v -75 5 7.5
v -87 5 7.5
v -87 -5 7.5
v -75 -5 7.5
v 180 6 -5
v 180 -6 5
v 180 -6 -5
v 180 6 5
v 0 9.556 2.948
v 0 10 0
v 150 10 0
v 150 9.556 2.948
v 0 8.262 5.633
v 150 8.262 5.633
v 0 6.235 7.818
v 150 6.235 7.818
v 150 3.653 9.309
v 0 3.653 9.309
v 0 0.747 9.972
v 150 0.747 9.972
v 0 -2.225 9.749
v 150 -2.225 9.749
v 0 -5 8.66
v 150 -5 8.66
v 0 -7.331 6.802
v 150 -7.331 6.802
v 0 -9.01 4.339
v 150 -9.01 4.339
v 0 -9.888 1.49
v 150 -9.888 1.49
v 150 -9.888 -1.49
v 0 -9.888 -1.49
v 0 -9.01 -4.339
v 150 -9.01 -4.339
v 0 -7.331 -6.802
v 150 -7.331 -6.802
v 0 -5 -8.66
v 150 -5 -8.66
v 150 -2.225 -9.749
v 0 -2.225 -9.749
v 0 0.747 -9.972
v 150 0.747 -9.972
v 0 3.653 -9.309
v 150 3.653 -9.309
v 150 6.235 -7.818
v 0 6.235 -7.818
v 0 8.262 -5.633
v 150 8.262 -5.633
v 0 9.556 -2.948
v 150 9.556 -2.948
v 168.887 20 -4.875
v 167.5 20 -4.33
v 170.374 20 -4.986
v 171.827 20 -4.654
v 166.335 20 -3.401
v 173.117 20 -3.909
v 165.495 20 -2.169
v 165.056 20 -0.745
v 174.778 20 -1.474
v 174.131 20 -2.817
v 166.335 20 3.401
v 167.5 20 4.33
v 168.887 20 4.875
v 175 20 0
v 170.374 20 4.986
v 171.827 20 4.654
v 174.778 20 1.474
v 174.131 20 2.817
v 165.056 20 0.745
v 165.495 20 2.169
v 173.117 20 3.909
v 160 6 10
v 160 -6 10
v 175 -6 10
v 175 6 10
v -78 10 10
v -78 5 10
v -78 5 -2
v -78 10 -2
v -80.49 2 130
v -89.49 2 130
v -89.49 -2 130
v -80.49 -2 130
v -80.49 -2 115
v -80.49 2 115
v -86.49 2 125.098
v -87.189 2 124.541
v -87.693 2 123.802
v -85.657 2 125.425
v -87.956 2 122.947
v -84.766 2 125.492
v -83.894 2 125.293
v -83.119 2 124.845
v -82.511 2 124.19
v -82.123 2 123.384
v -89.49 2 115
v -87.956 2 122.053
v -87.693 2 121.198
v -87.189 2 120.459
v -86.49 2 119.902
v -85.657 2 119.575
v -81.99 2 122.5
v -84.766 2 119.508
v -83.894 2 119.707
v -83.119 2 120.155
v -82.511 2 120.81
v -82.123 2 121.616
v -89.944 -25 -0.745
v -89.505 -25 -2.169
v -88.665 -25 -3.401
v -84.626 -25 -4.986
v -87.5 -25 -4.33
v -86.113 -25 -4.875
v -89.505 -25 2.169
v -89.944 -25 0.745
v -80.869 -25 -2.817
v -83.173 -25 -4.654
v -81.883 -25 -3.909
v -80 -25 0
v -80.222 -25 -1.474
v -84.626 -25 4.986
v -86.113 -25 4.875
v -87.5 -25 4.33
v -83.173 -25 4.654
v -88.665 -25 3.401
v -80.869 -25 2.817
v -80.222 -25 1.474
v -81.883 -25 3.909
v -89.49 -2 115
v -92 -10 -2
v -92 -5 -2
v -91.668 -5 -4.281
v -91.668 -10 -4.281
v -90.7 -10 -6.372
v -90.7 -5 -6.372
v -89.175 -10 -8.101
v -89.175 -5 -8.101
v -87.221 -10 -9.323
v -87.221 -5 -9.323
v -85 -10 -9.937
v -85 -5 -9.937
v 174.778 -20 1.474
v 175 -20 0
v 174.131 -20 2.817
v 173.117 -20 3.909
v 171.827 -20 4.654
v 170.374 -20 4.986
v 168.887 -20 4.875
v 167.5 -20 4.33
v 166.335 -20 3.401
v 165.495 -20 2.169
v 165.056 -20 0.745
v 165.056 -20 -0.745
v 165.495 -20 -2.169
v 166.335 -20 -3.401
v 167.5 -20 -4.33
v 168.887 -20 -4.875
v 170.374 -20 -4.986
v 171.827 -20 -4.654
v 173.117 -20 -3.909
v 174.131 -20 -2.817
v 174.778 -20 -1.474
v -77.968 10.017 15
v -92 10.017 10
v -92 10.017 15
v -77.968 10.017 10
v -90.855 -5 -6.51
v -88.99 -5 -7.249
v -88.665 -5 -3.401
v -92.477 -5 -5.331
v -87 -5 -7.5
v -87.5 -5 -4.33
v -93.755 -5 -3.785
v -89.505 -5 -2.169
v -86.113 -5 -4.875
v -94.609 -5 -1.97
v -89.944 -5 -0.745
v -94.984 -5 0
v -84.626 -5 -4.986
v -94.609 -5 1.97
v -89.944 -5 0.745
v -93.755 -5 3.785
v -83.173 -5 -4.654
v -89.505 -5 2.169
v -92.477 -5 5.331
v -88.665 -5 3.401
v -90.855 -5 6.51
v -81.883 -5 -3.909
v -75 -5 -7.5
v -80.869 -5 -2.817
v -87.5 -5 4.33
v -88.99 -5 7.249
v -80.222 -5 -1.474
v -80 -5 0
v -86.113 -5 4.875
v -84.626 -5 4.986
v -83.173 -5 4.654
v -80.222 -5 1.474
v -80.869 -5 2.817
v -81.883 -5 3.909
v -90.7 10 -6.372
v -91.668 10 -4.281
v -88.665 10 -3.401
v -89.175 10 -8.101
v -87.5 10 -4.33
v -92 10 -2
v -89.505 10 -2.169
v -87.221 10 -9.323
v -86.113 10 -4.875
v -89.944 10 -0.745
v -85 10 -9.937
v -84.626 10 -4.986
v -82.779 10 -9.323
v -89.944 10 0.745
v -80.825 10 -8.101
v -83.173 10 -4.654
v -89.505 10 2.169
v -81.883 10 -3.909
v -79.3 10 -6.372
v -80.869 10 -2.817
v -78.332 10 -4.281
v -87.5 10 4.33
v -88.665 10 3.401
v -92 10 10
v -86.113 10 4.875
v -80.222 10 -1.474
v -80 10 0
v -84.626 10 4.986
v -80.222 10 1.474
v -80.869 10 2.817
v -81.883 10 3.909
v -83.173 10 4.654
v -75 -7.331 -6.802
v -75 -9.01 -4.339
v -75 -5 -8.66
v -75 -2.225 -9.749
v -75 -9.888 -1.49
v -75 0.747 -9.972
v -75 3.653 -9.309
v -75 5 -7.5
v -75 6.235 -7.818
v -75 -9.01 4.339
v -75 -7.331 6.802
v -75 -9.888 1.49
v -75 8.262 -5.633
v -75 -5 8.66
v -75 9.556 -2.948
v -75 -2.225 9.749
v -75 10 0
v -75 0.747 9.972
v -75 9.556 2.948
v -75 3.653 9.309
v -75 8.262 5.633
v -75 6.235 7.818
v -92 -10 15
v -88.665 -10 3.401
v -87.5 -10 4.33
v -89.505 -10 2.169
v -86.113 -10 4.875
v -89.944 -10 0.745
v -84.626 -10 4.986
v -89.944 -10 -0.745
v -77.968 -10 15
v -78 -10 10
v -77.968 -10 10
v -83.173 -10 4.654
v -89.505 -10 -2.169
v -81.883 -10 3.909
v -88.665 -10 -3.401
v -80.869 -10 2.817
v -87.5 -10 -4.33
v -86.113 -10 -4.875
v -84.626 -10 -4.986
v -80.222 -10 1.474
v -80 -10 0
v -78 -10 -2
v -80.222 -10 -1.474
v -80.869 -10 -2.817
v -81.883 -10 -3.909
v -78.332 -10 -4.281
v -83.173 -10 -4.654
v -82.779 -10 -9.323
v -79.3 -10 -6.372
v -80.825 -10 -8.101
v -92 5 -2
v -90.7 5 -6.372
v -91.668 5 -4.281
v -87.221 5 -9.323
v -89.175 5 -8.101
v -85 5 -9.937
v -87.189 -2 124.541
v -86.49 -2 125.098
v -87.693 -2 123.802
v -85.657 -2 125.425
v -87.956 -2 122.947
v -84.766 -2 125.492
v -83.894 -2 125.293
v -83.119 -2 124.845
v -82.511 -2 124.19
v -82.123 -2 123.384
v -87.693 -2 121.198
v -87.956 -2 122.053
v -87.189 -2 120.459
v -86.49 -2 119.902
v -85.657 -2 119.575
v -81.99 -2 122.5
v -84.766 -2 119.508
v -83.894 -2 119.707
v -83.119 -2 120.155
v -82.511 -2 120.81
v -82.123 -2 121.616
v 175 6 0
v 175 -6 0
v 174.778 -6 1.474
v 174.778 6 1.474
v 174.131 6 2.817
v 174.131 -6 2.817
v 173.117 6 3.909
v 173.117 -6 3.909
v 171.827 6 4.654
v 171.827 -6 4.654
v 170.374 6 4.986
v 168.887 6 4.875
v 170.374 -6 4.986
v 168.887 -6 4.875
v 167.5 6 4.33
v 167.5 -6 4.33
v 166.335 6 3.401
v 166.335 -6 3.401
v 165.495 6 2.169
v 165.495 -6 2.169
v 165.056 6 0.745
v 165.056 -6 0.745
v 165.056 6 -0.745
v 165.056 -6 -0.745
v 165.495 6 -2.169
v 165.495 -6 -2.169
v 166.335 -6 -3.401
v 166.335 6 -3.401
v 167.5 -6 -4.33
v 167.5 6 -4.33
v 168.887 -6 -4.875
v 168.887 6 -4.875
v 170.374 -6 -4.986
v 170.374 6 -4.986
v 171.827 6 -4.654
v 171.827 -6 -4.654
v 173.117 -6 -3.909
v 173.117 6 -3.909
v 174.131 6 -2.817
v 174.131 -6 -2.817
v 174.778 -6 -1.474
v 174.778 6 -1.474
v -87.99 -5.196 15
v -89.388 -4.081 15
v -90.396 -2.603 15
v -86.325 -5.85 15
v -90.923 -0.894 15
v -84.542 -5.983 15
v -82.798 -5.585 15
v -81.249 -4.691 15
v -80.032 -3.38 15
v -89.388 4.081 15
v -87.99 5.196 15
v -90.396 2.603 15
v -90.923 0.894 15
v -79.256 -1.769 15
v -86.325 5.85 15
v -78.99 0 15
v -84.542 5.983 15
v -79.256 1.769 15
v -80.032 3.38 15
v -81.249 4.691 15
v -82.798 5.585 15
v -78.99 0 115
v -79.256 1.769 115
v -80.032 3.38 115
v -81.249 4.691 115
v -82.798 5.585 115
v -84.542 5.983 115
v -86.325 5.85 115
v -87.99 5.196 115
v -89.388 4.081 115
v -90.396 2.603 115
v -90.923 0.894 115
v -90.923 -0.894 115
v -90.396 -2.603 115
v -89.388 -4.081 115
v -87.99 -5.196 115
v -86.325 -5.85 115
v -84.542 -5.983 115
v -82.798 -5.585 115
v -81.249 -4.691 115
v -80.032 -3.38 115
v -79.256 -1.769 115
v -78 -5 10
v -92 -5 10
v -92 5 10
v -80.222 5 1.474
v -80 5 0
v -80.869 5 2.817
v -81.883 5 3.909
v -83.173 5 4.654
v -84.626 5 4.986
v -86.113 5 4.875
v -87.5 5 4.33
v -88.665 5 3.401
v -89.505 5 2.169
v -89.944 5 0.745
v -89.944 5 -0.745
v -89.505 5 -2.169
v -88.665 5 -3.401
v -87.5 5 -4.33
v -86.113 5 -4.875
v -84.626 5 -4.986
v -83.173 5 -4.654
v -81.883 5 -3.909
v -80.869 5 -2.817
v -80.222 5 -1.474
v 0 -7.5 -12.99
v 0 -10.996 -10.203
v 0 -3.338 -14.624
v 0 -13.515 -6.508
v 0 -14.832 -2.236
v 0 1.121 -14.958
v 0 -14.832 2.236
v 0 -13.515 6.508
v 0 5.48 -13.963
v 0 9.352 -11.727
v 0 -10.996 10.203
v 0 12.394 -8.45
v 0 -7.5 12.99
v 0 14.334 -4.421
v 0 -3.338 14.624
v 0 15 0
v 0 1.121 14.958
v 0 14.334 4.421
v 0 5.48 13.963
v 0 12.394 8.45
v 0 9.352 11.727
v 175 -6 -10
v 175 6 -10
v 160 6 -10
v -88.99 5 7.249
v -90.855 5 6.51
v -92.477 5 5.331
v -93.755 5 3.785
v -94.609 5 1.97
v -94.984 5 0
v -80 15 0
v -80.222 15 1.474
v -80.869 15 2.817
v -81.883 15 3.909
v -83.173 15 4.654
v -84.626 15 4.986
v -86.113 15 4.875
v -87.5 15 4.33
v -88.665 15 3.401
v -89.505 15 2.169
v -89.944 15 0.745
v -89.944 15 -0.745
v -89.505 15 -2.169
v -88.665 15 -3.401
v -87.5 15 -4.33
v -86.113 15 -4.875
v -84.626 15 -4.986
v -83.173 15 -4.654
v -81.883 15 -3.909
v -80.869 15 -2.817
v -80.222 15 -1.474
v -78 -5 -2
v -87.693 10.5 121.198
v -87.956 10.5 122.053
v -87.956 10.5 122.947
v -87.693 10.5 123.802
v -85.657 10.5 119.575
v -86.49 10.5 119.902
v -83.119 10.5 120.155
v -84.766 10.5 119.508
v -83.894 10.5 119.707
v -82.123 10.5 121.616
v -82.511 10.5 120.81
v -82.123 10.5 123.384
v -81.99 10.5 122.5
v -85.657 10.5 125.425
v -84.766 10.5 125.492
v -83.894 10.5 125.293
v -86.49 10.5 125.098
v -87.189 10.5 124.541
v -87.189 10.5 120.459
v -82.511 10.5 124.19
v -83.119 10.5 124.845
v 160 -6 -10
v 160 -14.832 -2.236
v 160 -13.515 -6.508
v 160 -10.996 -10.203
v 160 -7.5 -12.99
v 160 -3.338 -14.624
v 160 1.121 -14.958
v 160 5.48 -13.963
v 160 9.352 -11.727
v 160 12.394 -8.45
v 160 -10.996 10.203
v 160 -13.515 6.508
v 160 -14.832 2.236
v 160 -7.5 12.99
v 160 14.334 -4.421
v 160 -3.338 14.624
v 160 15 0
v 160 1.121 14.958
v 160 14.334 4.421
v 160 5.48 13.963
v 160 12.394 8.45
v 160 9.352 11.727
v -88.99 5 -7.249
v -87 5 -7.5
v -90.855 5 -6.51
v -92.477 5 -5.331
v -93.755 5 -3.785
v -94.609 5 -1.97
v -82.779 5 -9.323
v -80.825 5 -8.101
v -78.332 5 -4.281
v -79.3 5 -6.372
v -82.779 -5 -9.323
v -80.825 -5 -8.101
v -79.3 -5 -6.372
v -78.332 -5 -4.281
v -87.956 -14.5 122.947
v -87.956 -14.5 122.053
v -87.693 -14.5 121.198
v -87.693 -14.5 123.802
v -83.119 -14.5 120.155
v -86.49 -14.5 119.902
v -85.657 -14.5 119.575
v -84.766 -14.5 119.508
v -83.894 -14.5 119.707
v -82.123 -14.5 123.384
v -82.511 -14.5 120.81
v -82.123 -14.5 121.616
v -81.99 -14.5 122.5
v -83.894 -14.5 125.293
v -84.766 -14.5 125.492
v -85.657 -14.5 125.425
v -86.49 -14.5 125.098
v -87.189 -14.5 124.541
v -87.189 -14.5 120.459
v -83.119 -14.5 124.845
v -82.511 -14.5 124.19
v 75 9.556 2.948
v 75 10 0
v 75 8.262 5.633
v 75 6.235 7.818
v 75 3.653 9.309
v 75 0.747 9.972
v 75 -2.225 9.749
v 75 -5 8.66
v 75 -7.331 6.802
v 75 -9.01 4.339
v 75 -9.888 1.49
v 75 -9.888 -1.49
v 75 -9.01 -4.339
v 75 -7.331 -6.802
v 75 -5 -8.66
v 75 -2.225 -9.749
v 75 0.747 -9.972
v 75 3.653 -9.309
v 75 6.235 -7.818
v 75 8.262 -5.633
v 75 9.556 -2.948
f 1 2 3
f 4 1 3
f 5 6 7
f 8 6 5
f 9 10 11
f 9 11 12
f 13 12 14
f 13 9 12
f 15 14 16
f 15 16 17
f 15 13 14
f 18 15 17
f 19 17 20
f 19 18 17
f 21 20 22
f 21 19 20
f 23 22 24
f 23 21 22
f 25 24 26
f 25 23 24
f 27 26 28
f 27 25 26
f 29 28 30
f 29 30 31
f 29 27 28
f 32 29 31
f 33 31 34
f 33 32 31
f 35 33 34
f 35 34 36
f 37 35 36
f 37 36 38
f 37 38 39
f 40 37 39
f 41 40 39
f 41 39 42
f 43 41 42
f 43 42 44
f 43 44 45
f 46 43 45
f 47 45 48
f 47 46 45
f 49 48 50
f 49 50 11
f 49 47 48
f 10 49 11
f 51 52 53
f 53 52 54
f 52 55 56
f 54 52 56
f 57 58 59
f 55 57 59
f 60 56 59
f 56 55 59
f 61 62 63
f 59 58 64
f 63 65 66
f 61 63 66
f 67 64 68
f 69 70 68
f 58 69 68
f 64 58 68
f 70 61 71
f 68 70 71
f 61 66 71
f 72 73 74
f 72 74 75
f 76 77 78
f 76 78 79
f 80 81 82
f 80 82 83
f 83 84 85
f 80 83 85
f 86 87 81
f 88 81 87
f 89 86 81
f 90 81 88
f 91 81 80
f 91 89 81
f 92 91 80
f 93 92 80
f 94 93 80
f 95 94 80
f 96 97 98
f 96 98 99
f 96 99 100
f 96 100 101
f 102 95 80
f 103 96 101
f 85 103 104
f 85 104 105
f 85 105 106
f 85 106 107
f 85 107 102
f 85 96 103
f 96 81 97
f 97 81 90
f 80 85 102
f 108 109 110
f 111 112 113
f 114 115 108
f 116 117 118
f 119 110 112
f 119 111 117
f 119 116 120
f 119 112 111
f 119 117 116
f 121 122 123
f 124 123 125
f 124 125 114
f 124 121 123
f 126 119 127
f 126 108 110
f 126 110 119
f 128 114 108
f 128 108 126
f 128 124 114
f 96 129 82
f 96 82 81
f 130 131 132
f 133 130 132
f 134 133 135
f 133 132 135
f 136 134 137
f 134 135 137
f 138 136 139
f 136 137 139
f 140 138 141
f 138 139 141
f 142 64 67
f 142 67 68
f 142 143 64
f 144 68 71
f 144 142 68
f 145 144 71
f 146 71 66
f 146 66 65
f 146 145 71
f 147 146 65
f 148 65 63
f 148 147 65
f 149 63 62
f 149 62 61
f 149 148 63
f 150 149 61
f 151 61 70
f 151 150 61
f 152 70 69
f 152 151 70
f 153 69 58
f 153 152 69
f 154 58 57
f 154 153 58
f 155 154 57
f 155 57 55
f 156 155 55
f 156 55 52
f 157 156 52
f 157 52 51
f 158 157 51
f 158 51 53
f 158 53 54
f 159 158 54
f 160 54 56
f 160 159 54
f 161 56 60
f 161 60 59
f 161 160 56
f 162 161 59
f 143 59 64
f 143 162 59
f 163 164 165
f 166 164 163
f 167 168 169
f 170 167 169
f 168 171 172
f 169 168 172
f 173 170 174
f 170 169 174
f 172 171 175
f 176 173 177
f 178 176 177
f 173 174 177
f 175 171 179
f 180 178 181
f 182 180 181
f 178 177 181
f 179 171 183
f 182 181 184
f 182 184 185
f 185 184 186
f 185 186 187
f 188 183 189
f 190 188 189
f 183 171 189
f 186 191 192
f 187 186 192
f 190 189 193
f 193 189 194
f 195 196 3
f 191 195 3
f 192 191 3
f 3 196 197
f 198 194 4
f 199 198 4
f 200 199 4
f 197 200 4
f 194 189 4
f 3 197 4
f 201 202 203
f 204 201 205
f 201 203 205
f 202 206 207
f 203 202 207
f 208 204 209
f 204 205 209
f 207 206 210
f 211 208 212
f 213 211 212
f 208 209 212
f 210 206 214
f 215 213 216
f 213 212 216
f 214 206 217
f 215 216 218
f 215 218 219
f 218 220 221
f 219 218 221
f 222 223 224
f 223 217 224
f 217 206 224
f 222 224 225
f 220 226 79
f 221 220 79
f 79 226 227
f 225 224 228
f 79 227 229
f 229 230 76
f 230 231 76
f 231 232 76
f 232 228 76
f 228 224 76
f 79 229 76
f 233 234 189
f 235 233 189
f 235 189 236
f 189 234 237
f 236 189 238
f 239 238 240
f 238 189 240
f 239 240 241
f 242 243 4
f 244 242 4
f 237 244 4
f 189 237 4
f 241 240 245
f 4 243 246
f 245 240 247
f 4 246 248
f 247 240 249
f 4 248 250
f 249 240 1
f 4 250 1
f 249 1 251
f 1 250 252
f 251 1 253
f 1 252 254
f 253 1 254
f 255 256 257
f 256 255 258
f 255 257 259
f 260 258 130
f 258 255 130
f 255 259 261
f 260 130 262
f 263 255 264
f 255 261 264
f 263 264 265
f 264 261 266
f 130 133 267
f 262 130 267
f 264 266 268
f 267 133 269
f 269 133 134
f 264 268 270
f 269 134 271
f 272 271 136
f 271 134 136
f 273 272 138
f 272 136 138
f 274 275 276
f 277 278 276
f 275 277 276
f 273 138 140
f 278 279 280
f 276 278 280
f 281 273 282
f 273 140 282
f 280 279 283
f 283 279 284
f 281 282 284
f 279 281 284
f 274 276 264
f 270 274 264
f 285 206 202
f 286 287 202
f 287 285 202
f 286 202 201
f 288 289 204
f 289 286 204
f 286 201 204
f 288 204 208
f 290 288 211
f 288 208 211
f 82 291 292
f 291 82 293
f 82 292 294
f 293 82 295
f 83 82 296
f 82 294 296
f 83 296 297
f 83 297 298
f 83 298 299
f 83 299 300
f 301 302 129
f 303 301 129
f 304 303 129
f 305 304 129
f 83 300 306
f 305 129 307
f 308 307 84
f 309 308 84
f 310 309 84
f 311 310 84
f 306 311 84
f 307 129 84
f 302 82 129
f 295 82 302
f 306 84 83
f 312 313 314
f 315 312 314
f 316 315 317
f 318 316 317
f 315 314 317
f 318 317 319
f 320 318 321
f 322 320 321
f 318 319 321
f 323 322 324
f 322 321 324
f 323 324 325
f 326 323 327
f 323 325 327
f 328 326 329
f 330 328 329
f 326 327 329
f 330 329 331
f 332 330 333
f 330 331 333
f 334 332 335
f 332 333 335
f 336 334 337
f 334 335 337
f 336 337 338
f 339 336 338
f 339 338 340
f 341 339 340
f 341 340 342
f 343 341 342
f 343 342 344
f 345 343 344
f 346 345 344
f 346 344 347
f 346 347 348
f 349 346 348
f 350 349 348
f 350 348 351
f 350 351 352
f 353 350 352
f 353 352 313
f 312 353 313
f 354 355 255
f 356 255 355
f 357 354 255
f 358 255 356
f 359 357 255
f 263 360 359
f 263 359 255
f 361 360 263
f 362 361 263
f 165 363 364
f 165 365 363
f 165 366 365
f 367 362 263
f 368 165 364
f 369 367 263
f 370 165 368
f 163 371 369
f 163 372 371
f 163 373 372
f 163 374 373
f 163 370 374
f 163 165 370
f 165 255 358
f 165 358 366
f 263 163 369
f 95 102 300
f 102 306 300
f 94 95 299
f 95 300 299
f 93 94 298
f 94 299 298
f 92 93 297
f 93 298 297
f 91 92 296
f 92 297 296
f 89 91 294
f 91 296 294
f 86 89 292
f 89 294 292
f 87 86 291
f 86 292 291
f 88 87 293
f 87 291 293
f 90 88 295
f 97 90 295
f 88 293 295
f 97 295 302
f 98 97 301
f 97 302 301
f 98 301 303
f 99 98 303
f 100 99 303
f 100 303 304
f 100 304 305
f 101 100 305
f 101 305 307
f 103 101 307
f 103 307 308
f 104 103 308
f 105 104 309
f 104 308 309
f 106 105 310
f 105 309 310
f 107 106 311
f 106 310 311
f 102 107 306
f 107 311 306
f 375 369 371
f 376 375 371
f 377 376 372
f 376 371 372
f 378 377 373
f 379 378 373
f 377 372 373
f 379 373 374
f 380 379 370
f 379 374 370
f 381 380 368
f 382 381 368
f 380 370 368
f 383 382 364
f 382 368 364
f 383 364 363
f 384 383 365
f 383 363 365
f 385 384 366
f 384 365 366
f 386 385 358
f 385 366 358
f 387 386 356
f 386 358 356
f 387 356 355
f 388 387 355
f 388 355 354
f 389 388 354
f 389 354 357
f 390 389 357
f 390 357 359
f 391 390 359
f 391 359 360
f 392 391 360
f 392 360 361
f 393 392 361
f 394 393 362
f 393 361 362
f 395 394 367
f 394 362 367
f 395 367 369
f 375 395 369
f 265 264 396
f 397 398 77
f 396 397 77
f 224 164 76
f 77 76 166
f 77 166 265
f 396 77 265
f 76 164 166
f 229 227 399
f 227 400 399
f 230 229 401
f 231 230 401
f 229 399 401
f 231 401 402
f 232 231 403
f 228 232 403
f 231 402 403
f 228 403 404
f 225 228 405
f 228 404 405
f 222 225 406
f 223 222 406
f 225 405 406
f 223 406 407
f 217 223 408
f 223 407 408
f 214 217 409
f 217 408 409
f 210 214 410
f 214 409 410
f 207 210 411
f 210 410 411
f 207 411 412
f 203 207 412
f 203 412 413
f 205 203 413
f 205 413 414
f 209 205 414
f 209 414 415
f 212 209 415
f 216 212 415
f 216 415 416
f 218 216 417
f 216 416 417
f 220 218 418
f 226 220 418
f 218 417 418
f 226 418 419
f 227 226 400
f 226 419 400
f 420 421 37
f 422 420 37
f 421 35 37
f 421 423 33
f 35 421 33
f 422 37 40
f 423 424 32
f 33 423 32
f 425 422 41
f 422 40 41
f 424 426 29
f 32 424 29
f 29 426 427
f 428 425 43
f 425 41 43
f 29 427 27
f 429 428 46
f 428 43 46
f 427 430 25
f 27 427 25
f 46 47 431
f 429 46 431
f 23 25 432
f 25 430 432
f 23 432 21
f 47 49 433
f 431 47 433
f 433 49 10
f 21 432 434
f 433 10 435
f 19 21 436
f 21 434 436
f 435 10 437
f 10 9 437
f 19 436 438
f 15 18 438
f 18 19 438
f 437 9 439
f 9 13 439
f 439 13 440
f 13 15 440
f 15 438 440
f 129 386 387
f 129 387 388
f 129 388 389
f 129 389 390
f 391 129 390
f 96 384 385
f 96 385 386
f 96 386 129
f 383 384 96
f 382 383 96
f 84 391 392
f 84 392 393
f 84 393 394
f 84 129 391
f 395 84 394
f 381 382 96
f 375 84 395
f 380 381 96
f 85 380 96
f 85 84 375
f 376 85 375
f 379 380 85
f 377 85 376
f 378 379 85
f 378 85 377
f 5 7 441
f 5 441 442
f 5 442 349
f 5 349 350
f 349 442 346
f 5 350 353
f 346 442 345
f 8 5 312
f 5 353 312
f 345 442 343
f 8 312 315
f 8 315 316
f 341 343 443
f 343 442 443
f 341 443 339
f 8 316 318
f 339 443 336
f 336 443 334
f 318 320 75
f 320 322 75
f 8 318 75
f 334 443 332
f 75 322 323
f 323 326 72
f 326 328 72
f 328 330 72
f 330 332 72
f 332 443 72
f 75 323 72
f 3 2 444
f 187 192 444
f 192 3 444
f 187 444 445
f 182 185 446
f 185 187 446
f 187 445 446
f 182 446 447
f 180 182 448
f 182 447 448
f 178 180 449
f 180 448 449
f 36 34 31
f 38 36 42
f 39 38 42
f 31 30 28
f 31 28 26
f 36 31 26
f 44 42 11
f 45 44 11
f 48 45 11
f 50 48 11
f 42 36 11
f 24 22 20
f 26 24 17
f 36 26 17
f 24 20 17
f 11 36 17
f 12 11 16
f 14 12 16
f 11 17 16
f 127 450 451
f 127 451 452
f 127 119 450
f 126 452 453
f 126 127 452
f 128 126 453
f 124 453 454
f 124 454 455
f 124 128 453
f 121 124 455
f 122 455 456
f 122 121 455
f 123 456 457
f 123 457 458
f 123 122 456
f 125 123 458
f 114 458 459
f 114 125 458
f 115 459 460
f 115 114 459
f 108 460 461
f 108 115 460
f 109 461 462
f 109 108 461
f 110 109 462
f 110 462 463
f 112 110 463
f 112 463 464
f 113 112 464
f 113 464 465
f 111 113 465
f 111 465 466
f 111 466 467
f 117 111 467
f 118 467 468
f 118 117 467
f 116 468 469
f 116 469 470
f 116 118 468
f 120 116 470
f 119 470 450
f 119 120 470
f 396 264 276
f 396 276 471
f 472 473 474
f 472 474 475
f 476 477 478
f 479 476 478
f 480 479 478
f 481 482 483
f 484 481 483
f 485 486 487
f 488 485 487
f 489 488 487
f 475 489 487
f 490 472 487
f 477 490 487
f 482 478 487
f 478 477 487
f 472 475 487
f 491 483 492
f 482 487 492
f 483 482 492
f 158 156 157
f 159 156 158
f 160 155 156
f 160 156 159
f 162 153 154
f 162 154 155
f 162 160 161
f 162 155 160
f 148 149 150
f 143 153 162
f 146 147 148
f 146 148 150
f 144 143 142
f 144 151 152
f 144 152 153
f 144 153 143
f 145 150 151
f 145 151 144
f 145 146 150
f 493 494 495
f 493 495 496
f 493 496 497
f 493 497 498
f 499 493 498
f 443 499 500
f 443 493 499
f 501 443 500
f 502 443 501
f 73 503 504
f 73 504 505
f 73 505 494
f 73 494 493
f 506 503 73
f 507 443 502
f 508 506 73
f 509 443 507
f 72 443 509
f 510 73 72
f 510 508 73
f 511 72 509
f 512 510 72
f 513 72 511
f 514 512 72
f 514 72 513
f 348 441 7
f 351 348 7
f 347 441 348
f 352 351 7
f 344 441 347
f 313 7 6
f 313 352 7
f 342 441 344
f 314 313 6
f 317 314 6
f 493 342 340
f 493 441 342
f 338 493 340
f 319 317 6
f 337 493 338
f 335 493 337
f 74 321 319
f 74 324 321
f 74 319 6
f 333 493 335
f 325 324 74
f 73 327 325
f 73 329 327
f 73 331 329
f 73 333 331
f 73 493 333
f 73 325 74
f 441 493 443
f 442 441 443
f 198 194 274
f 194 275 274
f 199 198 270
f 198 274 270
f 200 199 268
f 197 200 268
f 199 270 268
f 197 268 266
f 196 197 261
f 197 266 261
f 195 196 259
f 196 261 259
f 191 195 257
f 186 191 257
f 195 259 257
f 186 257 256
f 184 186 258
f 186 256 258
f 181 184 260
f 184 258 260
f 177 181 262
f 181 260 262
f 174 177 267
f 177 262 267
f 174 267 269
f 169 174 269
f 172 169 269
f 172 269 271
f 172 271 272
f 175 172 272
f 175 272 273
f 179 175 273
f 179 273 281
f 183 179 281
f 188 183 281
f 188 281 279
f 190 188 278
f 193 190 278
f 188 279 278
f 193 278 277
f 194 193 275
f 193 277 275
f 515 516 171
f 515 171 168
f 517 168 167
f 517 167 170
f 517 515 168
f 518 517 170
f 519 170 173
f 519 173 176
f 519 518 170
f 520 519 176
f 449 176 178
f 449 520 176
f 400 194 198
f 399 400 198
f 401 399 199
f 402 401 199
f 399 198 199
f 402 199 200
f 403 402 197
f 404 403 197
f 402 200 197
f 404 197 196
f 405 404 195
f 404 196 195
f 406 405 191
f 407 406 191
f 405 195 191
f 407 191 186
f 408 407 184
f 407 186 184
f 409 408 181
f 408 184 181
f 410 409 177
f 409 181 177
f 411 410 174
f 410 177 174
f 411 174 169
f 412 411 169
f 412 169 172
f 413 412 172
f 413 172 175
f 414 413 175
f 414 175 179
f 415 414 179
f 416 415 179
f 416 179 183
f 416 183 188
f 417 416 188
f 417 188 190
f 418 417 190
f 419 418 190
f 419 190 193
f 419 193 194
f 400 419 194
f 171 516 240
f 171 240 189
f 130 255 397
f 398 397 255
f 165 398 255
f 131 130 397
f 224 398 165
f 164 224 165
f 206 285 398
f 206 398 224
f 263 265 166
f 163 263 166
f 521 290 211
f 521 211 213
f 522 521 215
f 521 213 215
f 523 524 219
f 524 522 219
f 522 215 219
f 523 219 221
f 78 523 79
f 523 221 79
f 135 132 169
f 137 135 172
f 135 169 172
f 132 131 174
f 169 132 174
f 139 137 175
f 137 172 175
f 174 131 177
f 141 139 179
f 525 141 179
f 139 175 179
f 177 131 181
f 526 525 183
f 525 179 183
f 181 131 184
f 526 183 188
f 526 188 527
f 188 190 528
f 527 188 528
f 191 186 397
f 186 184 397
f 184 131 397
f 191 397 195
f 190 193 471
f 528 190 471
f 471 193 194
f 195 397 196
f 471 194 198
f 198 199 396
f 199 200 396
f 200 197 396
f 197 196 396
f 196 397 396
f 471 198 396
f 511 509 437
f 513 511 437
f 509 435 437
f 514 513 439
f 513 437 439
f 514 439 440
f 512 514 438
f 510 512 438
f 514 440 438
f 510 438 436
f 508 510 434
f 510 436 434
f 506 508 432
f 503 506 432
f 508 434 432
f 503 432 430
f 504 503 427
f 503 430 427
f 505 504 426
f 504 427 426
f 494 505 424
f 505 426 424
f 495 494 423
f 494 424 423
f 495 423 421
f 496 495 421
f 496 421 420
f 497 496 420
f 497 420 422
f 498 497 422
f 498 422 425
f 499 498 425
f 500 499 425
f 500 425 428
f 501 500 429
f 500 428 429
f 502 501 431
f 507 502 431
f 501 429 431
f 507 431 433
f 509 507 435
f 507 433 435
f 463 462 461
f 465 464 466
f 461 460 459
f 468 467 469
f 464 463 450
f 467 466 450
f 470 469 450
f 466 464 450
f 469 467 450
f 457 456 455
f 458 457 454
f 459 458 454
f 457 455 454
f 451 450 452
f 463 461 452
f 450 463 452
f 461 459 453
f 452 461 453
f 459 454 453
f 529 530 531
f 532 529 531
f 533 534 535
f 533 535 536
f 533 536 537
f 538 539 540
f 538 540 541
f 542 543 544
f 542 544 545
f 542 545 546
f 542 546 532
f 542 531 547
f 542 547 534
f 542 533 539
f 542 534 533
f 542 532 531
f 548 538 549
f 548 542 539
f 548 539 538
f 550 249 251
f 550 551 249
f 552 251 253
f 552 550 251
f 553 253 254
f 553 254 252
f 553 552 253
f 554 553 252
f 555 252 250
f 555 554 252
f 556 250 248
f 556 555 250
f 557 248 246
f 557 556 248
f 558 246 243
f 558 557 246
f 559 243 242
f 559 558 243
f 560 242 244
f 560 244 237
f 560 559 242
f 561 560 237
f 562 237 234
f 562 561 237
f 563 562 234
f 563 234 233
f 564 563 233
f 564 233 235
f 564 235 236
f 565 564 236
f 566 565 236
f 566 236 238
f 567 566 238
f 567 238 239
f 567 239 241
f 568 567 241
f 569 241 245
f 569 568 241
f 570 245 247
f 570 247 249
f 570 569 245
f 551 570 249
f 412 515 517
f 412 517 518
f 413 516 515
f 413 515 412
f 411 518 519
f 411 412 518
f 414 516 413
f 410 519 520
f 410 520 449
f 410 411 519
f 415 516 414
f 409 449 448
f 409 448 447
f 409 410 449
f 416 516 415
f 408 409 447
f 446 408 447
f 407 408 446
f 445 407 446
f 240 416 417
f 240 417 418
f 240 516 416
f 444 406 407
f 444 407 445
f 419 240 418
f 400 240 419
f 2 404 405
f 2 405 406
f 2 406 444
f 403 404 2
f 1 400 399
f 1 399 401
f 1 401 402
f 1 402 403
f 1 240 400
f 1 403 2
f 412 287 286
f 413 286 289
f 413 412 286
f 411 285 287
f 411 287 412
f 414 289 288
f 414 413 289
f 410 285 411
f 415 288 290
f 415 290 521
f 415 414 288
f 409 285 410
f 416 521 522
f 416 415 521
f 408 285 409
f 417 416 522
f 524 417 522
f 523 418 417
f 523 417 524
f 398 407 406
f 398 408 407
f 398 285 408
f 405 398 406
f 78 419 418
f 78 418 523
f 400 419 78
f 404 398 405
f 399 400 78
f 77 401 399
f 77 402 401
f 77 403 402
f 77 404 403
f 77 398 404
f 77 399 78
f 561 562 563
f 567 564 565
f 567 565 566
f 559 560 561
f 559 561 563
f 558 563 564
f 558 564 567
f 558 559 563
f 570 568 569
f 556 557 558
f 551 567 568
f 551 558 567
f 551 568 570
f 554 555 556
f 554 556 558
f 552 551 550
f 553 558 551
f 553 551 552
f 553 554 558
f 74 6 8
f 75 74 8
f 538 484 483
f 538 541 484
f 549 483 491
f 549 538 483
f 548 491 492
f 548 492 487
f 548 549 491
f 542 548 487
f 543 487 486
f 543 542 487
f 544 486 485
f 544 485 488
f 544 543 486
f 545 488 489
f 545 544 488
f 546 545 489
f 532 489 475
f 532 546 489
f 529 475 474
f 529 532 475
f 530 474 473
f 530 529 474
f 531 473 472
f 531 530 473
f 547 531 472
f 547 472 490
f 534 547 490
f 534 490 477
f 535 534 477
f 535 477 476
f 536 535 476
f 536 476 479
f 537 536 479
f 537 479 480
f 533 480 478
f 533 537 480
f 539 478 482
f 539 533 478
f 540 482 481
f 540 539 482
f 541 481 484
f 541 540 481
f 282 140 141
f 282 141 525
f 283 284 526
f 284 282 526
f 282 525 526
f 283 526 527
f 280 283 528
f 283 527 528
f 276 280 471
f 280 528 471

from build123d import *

# Parameters (mm, degrees)
F0_R         = 10
F1_DEPTH     = 75
F2_R         = 15
F2_R_2       = 10
F3_DEPTH     = 150
F4_R         = 15
F5_DEPTH     = 10
F6_W         = 12
F6_H         = 20
F7_DEPTH     = 20
F8_R         = 5
F9_DEPTH     = 21.001
F10_SIZE     = 5
F11_W        = 10
F11_H        = 15
F12_DEPTH    = 20
F13_R        = 5
F14_DEPTH    = 20.001
F15_R        = 5
F16_DEPTH    = 20
F17_W        = 14
F17_H        = 5
F18_DEPTH    = 10
F19_W        = 14.032341361
F19_H        = 20.0174024701
F20_DEPTH    = 5
F21_R        = 5
F22_DEPTH    = 20
F24_T1_DEPTH = 45
F24_T3_DEPTH = 45
F25_R        = 6
F26_DEPTH    = 100
F27_W        = 9
F27_H        = 4
F28_DEPTH    = 15
F29_R        = 3
F30_DEPTH    = 12.5
F32_T1_DEPTH = 50


# Not quite as in the source:
# - a fillet or chamfer that OpenCascade refuses, or shapes differently, is made with other operations: its cross-section is extruded or revolved along the edge and cut away or added


with BuildPart() as f1:
    # F0 (on Right) → F1 (new body, symmetric)
    with BuildSketch(Plane.YZ):
        Circle(F0_R)
    extrude(amount=F1_DEPTH, both=True)

    # F11 (on face) → F12 (join)
    with BuildSketch(Plane(origin=(-75, 0, 0), x_dir=(0, -1, 0), z_dir=(-1, 0, 0))):
        Rectangle(F11_W, F11_H)
    extrude(amount=F12_DEPTH)

    # F13 (on face) → F14 (cut, through all)
    with BuildSketch(Plane.XZ.offset(5)):
        with Locations((-85, 0)):
            Circle(F13_R)
    extrude(amount=-F14_DEPTH, mode=Mode.SUBTRACT)

    # F32: fillet of radius 8 on 2 edges, made by hand

    # F32_s2 → F32_t1 (cut)
    with BuildSketch(Plane.XZ.offset(-25)):
        with BuildLine():
            ThreePointArc((-87, 7.5), (-92.6568542495, 5.1568542495), (-95, -0.5))
            Line((-95, -0.5), (-95, 7.5))
            Line((-95, 7.5), (-87, 7.5))
        make_face()
        with BuildLine():
            ThreePointArc((-87, -7.5), (-92.6568542495, -5.1568542495), (-95, 0.5))
            Line((-95, 0.5), (-95, -7.5))
            Line((-95, -7.5), (-87, -7.5))
        make_face()
    extrude(amount=F32_T1_DEPTH, mode=Mode.SUBTRACT)


with BuildPart() as f3:
    # F2 (on Right) → F3 (new body)
    with BuildSketch(Plane.YZ):
        Circle(F2_R)
        Circle(F2_R_2, mode=Mode.SUBTRACT)
    extrude(amount=F3_DEPTH)

    # F4 (on face) → F5 (join)
    with BuildSketch(Plane.YZ.offset(150)):
        Circle(F4_R)
    extrude(amount=F5_DEPTH)

    # F6 (on face) → F7 (join)
    with BuildSketch(Plane.YZ.offset(160)):
        Rectangle(F6_W, F6_H)
    extrude(amount=F7_DEPTH)

    # F8 (on face) → F9 (cut, through all)
    with BuildSketch(Plane.XZ.offset(6)):
        with Locations((170, 0)):
            Circle(F8_R)
    extrude(amount=-F9_DEPTH, mode=Mode.SUBTRACT)

    # F10
    f10_edges = [f3.edges().sort_by_distance(p)[0] for p in [
        (180, 0, 10),
        (180, 0, -10),
    ]]
    chamfer(f10_edges, length=F10_SIZE)


with BuildPart() as f16:
    # F15 (on Front) → F16 (new body, symmetric)
    with BuildSketch(Plane.XZ):
        with Locations((170, 0)):
            Circle(F15_R)
    extrude(amount=F16_DEPTH, both=True)


with BuildPart() as f18:
    # F17 (on Top) → F18 (new body, symmetric)
    with BuildSketch(Plane.XY):
        with Locations((-85, 7.5)):
            Rectangle(F17_W, F17_H)
    extrude(amount=F18_DEPTH, both=True)



with BuildPart() as f18b:
    # F17 (on Top) → F18, piece 2 (new body, symmetric)
    with BuildSketch(Plane.XY):
        with Locations((-85, -7.5)):
            Rectangle(F17_W, F17_H)
    extrude(amount=F18_DEPTH, both=True)


with BuildPart() as f18_1:
    add(f18.part)

    add(f18b.part)  # F20 merges F18b
    # F19 (on face) → F20 (join)
    with BuildSketch(Plane.XY.offset(10)):
        with Locations((-84.9838293195, 0.0087012351)):
            Rectangle(F19_W, F19_H)
    extrude(amount=F20_DEPTH)


with BuildPart() as f22:
    # F21 (on face) → F22 (new body, symmetric)
    with BuildSketch(Plane.XZ.offset(5)):
        with Locations((-85, 0)):
            Circle(F21_R)
    extrude(amount=F22_DEPTH, both=True)


with BuildPart() as f18_2:
    add(f18_1.part)

    # F23: cut F22
    add(f22.part, mode=Mode.SUBTRACT)

    # F24: fillet of radius 8 on 4 edges, made by hand

    # F24_s2 → F24_t1 (cut)
    with BuildSketch(Plane.XZ.offset(-30)):
        with BuildLine():
            ThreePointArc((-92, -2), (-89.6568542495, -7.6568542495), (-84, -10))
            Line((-84, -10), (-92, -10))
            Line((-92, -10), (-92, -2))
        make_face()
        with BuildLine():
            ThreePointArc((-86, -10), (-80.3431457505, -7.6568542495), (-78, -2))
            Line((-78, -2), (-78, -10))
            Line((-78, -10), (-86, -10))
        make_face()
    extrude(amount=F24_T1_DEPTH, mode=Mode.SUBTRACT)

    # F24_s4 → F24_t3 (cut)
    with BuildSketch(Plane.XZ.offset(-15)):
        with BuildLine():
            ThreePointArc((-86, -10), (-80.3431457505, -7.6568542495), (-78, -2))
            Line((-78, -2), (-78, -10))
            Line((-78, -10), (-86, -10))
        make_face()
        with BuildLine():
            ThreePointArc((-84, -10), (-89.6568542495, -7.6568542495), (-92, -2))
            Line((-92, -2), (-92, -10))
            Line((-92, -10), (-84, -10))
        make_face()
    extrude(amount=F24_T3_DEPTH, mode=Mode.SUBTRACT)

    # F25 (on face) → F26 (join)
    with BuildSketch(Plane.XY.offset(15)):
        with Locations((-84.9899289471, 0)):
            Circle(F25_R)
    extrude(amount=F26_DEPTH)

    # F27 (on face) → F28 (join)
    with BuildSketch(Plane.XY.offset(115)):
        with Locations((-84.9899289471, 0)):
            Rectangle(F27_W, F27_H)
    extrude(amount=F28_DEPTH)


with BuildPart() as f30:
    # F29 (on face) → F30 (new body, symmetric)
    with BuildSketch(Plane.XZ.offset(2)):
        with Locations((-84.9899289471, 122.5)):
            Circle(F29_R)
    extrude(amount=F30_DEPTH, both=True)


with BuildPart() as f18_3:
    add(f18_2.part)

    # F31: cut F30
    add(f30.part, mode=Mode.SUBTRACT)


solid = Compound([f1.part, f3.part, f16.part, f22.part, f30.part, f18_3.part])
